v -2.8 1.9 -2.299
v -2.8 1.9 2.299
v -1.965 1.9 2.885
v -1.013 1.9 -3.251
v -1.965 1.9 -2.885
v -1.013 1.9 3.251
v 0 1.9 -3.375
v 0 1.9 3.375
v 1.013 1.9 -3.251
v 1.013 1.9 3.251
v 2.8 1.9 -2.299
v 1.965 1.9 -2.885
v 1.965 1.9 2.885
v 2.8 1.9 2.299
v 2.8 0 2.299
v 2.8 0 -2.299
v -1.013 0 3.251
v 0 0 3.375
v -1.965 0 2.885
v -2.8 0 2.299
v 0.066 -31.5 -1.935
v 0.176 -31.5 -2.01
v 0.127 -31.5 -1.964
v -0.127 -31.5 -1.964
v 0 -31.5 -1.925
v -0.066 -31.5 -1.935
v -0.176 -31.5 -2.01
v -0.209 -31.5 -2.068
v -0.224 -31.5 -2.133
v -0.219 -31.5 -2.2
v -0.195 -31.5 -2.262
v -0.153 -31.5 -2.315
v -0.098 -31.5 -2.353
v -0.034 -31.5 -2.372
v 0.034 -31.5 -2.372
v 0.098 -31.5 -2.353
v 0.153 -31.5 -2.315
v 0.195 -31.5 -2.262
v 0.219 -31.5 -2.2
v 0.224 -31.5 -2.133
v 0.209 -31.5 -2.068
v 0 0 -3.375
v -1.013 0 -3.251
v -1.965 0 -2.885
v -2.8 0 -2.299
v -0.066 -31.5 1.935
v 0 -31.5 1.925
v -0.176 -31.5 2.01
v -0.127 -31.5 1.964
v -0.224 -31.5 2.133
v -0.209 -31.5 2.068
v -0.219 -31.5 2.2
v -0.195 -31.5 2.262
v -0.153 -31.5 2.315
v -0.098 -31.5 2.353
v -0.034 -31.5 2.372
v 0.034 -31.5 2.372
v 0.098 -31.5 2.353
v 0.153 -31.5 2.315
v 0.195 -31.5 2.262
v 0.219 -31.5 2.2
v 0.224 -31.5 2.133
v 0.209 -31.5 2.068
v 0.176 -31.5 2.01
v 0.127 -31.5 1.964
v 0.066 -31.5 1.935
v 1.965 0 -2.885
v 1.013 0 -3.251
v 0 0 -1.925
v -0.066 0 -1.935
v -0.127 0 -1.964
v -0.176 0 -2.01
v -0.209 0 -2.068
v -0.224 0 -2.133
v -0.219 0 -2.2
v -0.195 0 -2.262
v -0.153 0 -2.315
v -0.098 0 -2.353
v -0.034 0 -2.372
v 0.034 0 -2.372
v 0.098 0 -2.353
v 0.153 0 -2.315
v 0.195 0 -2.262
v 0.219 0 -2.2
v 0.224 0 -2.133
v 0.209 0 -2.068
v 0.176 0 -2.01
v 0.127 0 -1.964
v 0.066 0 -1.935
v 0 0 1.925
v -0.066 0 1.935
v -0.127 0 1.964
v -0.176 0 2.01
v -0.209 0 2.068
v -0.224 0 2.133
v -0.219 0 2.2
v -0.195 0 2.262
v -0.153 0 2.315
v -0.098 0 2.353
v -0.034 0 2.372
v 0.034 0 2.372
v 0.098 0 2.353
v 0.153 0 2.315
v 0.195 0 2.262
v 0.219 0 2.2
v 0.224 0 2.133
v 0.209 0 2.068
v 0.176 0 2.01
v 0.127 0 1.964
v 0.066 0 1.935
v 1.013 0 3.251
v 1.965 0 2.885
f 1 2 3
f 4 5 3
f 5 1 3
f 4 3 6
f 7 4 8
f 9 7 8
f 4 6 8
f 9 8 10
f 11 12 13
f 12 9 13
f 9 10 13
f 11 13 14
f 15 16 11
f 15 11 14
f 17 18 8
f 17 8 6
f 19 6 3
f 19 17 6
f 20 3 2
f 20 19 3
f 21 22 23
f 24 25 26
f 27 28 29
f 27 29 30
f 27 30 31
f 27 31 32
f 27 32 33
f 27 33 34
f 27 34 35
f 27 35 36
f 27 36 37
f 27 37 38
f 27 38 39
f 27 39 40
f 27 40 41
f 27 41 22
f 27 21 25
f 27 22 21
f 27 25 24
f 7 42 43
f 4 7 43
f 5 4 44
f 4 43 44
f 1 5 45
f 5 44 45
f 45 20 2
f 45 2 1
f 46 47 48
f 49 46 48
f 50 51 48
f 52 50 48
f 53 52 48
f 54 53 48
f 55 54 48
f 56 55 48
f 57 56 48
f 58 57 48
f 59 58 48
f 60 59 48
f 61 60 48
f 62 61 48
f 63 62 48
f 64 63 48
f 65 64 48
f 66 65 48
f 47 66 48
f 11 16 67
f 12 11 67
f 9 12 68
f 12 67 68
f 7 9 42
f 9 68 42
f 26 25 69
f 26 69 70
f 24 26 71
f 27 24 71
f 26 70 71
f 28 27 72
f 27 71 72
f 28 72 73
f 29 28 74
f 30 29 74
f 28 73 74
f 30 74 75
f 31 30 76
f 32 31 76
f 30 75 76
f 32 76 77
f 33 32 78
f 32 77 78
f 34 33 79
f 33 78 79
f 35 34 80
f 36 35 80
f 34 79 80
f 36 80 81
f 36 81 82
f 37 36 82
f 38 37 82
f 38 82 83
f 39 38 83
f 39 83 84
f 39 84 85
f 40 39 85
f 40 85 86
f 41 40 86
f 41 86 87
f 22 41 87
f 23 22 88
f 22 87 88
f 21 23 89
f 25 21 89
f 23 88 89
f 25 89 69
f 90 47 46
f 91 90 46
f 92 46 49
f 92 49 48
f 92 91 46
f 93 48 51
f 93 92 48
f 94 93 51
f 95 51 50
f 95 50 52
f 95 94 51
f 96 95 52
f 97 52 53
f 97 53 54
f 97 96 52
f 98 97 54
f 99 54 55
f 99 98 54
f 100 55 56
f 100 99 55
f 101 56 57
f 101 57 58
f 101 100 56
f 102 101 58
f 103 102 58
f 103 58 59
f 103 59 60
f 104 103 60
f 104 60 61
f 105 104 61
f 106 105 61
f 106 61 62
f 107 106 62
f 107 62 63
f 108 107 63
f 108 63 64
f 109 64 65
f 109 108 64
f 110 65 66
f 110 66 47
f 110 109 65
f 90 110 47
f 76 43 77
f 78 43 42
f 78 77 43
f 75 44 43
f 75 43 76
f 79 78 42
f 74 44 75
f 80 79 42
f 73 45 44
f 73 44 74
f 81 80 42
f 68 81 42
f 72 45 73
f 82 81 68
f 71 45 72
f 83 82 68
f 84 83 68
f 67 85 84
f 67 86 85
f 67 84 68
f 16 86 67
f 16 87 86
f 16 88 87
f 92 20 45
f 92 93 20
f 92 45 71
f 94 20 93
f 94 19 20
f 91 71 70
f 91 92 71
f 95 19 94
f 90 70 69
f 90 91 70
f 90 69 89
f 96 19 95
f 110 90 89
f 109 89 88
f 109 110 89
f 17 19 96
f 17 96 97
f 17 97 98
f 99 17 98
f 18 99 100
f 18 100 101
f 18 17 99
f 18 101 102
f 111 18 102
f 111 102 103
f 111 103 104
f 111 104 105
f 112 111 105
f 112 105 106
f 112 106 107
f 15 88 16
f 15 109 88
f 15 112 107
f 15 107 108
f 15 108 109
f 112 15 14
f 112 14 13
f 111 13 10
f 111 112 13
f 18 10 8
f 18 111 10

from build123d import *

# Parameters (mm, degrees)
BOSS_EXTRUDE1_DEPTH = 1.9
SKETCH2_R           = 0.225
BOSS_EXTRUDE2_DEPTH = 31.5


with BuildPart() as part:
    # Sketch1 → Boss-Extrude1 (new body)
    with BuildSketch(Plane(origin=(0, 0, 0), x_dir=(1, 0, 0), z_dir=(0, 1, 0))):
        with BuildLine():
            Line((-2.8, 2.298937026), (-2.8, 0))
            Line((-2.8, 0), (2.8, 0))
            Line((2.8, 0), (2.8, 2.298937026))
            ThreePointArc((2.8, 2.298937026), (1.49982595, 3.096723441), (0, 3.375))
            ThreePointArc((0, 3.375), (-1.49982595, 3.096723441), (-2.8, 2.298937026))
        make_face()
    boss_extrude1 = extrude(amount=BOSS_EXTRUDE1_DEPTH)

    # Sketch2 → Boss-Extrude2 (add)
    with BuildSketch(Plane.XZ):
        with Locations(Location((0, -2.15, 0), (0, 0, 90))):
            Circle(SKETCH2_R)
    boss_extrude2 = extrude(amount=BOSS_EXTRUDE2_DEPTH)

    # Mirror2: Boss-Extrude1, Boss-Extrude2 across plane
    add(boss_extrude1.mirror(Plane.XY))
    add(boss_extrude2.mirror(Plane.XY))


solid = part.part
